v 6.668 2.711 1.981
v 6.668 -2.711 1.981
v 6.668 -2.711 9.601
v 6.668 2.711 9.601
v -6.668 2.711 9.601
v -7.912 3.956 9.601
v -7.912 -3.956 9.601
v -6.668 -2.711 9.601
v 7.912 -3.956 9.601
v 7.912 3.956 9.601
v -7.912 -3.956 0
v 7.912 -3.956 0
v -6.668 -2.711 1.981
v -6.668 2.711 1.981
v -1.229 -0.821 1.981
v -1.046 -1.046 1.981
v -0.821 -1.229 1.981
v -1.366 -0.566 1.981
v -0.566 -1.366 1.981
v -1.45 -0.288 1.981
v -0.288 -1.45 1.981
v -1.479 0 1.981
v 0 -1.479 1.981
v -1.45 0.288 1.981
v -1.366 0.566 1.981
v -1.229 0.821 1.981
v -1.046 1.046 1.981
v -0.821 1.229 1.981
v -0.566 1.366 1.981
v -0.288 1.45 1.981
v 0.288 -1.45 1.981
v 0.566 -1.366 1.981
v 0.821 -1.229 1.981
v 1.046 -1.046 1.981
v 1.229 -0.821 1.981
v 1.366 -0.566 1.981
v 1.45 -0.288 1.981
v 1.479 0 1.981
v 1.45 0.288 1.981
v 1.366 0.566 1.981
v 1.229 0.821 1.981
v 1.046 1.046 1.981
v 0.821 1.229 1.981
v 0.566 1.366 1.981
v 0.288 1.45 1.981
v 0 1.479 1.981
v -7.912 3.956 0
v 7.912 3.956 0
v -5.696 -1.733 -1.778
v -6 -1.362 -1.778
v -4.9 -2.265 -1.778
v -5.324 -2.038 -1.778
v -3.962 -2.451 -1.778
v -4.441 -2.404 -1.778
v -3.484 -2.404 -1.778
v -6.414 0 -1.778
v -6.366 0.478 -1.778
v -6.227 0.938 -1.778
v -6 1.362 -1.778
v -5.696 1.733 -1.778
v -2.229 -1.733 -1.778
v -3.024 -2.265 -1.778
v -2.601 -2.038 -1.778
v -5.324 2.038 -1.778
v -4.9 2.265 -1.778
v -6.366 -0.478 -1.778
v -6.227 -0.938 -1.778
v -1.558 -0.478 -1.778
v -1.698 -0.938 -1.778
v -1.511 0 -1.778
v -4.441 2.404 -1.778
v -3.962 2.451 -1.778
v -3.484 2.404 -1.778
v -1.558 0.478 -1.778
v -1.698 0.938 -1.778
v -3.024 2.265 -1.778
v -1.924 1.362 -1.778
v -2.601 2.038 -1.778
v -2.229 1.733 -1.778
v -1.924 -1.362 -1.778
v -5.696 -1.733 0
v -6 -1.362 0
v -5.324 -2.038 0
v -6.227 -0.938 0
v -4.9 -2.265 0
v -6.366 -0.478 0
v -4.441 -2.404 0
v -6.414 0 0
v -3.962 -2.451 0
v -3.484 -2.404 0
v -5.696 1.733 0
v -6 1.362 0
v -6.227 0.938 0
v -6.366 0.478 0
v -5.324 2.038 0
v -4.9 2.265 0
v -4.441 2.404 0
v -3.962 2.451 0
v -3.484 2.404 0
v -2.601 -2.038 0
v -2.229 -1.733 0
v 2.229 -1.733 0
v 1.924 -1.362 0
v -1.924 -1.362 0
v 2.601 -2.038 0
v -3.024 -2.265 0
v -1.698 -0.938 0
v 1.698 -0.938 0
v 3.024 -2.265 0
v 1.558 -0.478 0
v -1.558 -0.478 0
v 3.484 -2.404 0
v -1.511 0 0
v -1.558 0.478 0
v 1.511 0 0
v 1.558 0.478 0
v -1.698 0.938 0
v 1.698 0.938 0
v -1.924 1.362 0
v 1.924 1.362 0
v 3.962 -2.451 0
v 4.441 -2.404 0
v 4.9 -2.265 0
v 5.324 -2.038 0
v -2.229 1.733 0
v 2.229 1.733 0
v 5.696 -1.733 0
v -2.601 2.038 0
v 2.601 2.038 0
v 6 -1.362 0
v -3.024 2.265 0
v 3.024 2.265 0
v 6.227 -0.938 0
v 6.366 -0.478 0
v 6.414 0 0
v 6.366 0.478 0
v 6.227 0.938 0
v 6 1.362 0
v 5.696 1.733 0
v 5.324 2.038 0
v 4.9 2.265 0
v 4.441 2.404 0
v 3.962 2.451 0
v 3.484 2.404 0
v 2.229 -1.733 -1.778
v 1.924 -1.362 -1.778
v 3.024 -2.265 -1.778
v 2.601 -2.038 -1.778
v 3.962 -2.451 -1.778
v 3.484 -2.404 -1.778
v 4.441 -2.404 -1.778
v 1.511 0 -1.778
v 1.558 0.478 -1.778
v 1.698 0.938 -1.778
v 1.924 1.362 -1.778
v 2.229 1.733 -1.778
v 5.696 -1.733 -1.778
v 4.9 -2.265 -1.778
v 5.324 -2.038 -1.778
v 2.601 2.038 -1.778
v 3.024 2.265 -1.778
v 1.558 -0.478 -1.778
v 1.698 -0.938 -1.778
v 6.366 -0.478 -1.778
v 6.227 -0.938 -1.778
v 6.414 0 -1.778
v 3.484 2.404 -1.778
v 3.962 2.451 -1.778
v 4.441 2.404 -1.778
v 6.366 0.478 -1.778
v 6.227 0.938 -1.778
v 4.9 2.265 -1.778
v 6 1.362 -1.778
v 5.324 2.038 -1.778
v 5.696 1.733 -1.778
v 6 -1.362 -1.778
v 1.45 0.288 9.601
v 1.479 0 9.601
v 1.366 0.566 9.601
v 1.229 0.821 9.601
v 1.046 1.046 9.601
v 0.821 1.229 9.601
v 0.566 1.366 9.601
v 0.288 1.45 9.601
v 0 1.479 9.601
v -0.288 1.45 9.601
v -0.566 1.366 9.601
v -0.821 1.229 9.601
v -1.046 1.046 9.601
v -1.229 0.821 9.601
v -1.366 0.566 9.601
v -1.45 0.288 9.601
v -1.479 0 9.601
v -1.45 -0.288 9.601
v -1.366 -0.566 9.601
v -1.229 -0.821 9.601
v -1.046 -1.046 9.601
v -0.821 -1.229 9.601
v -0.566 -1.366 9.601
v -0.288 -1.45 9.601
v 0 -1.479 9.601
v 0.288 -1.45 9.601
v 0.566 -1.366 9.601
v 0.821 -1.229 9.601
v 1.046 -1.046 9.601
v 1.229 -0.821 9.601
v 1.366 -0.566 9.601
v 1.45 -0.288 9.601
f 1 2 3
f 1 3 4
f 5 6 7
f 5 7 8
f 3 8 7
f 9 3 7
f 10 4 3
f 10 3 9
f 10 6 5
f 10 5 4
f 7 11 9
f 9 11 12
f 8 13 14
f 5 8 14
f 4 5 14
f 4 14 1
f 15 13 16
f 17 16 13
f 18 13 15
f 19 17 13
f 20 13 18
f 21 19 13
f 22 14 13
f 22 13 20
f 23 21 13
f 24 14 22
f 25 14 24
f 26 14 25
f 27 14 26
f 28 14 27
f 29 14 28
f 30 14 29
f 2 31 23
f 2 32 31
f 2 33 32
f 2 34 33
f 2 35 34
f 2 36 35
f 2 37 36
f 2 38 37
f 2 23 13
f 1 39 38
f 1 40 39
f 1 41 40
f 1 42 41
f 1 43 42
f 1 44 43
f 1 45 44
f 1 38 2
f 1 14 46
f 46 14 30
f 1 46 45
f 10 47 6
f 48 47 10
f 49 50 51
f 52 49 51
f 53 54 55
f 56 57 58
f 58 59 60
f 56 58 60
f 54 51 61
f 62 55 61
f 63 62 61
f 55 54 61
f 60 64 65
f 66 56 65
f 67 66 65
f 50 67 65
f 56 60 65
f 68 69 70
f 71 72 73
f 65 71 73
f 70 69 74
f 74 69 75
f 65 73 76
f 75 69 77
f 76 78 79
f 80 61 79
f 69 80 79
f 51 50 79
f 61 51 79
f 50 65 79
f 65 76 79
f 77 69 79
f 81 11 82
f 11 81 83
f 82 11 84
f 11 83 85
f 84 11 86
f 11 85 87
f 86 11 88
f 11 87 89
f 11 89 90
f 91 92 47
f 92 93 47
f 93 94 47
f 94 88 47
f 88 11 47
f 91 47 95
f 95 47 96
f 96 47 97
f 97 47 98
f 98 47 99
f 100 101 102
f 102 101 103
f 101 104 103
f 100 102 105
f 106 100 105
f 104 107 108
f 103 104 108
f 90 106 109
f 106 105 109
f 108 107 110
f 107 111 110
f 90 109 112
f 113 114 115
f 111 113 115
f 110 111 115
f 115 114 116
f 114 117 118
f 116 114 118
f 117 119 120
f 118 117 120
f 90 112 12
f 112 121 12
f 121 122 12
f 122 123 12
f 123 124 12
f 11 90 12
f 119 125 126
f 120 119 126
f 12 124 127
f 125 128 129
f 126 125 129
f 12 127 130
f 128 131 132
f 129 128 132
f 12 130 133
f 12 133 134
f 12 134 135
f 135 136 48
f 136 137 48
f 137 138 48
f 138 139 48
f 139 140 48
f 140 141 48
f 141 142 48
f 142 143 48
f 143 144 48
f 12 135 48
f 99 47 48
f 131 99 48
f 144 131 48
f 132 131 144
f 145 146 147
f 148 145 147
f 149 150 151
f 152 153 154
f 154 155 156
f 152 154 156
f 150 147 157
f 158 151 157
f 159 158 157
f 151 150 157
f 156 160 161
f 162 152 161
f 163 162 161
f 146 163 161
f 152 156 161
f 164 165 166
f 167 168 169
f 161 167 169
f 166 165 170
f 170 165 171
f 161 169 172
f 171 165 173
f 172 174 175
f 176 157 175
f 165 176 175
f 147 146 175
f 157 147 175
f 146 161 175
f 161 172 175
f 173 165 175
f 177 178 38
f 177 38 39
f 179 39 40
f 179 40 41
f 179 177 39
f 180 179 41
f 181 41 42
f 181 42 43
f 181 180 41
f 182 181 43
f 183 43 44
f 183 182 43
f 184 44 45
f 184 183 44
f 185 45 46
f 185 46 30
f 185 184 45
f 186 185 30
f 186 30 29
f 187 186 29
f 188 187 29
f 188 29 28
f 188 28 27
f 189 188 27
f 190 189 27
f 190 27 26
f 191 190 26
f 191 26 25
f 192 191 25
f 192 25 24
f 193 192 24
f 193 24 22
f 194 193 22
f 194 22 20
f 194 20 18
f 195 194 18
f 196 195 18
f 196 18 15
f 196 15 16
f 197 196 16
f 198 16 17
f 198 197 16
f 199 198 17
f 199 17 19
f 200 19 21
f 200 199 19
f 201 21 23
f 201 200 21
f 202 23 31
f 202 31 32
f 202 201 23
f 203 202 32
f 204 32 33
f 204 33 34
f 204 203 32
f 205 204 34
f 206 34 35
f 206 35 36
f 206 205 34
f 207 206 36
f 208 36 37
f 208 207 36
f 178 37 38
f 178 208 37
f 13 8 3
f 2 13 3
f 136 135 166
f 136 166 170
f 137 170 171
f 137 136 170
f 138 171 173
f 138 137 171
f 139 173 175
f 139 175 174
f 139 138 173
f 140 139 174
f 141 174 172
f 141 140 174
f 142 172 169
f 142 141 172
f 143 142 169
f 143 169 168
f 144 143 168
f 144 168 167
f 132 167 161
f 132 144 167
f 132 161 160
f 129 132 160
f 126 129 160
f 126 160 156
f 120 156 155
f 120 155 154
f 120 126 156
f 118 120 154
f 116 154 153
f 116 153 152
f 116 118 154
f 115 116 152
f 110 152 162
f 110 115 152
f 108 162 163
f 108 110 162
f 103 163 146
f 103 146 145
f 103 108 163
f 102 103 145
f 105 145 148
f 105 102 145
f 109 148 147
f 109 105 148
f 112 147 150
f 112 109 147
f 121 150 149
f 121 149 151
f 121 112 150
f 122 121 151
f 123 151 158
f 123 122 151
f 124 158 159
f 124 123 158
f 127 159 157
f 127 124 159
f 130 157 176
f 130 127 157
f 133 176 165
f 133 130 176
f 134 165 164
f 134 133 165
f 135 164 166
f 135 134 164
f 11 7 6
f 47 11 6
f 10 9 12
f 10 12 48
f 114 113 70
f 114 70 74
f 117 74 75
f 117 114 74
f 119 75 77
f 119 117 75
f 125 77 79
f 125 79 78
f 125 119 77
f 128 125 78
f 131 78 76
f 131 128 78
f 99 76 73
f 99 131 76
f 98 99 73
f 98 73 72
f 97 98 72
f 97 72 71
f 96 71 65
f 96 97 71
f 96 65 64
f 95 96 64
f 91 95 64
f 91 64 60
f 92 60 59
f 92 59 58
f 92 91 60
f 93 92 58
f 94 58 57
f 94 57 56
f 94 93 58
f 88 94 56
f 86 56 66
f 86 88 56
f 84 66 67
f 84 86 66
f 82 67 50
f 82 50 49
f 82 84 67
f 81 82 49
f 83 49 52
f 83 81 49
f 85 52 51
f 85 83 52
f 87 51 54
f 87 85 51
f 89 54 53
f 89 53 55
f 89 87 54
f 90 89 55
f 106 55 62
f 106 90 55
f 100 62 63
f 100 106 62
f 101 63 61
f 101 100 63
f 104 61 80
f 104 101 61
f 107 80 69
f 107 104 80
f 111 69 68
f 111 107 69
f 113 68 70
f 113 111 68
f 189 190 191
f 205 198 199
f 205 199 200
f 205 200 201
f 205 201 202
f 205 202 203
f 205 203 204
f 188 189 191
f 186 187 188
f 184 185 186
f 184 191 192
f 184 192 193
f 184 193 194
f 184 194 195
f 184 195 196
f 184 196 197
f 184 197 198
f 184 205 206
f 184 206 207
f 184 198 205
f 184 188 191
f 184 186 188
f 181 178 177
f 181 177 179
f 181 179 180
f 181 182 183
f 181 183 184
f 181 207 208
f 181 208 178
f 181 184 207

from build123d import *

# Parameters (mm, degrees)
F0_W     = 15.8242
F0_H     = 7.9121
F2_DEPTH = 9.6012
F1_R     = 2.4511
F3_DEPTH = 1.778
F4_W     = 13.335
F4_H     = 5.4229
F6_DEPTH = 7.62
F5_R     = 1.478616
F7_DEPTH = 8.128


with BuildPart() as f2:
    # F0 (on Top) → F2 (new body)
    with BuildSketch(Plane.XY):
        Rectangle(F0_W, F0_H)
    extrude(amount=F2_DEPTH)

    # F1 (on face) → F3 (join)
    with BuildSketch(Plane.XY):
        with Locations((-3.9624, 0)):
            Circle(F1_R)
        with Locations((3.9624, 0)):
            Circle(F1_R)
    extrude(amount=-F3_DEPTH)

    # F4 (on face) → F6 (cut)
    with BuildSketch(Plane.XY.offset(9.6012)):
        Rectangle(F4_W, F4_H)
    extrude(amount=-F6_DEPTH, mode=Mode.SUBTRACT)

    # F5 (on face) → F7 (join)
    with BuildSketch(Plane.XY.offset(9.6012)):
        Circle(F5_R)
    extrude(amount=-F7_DEPTH)


solid = f2.part
